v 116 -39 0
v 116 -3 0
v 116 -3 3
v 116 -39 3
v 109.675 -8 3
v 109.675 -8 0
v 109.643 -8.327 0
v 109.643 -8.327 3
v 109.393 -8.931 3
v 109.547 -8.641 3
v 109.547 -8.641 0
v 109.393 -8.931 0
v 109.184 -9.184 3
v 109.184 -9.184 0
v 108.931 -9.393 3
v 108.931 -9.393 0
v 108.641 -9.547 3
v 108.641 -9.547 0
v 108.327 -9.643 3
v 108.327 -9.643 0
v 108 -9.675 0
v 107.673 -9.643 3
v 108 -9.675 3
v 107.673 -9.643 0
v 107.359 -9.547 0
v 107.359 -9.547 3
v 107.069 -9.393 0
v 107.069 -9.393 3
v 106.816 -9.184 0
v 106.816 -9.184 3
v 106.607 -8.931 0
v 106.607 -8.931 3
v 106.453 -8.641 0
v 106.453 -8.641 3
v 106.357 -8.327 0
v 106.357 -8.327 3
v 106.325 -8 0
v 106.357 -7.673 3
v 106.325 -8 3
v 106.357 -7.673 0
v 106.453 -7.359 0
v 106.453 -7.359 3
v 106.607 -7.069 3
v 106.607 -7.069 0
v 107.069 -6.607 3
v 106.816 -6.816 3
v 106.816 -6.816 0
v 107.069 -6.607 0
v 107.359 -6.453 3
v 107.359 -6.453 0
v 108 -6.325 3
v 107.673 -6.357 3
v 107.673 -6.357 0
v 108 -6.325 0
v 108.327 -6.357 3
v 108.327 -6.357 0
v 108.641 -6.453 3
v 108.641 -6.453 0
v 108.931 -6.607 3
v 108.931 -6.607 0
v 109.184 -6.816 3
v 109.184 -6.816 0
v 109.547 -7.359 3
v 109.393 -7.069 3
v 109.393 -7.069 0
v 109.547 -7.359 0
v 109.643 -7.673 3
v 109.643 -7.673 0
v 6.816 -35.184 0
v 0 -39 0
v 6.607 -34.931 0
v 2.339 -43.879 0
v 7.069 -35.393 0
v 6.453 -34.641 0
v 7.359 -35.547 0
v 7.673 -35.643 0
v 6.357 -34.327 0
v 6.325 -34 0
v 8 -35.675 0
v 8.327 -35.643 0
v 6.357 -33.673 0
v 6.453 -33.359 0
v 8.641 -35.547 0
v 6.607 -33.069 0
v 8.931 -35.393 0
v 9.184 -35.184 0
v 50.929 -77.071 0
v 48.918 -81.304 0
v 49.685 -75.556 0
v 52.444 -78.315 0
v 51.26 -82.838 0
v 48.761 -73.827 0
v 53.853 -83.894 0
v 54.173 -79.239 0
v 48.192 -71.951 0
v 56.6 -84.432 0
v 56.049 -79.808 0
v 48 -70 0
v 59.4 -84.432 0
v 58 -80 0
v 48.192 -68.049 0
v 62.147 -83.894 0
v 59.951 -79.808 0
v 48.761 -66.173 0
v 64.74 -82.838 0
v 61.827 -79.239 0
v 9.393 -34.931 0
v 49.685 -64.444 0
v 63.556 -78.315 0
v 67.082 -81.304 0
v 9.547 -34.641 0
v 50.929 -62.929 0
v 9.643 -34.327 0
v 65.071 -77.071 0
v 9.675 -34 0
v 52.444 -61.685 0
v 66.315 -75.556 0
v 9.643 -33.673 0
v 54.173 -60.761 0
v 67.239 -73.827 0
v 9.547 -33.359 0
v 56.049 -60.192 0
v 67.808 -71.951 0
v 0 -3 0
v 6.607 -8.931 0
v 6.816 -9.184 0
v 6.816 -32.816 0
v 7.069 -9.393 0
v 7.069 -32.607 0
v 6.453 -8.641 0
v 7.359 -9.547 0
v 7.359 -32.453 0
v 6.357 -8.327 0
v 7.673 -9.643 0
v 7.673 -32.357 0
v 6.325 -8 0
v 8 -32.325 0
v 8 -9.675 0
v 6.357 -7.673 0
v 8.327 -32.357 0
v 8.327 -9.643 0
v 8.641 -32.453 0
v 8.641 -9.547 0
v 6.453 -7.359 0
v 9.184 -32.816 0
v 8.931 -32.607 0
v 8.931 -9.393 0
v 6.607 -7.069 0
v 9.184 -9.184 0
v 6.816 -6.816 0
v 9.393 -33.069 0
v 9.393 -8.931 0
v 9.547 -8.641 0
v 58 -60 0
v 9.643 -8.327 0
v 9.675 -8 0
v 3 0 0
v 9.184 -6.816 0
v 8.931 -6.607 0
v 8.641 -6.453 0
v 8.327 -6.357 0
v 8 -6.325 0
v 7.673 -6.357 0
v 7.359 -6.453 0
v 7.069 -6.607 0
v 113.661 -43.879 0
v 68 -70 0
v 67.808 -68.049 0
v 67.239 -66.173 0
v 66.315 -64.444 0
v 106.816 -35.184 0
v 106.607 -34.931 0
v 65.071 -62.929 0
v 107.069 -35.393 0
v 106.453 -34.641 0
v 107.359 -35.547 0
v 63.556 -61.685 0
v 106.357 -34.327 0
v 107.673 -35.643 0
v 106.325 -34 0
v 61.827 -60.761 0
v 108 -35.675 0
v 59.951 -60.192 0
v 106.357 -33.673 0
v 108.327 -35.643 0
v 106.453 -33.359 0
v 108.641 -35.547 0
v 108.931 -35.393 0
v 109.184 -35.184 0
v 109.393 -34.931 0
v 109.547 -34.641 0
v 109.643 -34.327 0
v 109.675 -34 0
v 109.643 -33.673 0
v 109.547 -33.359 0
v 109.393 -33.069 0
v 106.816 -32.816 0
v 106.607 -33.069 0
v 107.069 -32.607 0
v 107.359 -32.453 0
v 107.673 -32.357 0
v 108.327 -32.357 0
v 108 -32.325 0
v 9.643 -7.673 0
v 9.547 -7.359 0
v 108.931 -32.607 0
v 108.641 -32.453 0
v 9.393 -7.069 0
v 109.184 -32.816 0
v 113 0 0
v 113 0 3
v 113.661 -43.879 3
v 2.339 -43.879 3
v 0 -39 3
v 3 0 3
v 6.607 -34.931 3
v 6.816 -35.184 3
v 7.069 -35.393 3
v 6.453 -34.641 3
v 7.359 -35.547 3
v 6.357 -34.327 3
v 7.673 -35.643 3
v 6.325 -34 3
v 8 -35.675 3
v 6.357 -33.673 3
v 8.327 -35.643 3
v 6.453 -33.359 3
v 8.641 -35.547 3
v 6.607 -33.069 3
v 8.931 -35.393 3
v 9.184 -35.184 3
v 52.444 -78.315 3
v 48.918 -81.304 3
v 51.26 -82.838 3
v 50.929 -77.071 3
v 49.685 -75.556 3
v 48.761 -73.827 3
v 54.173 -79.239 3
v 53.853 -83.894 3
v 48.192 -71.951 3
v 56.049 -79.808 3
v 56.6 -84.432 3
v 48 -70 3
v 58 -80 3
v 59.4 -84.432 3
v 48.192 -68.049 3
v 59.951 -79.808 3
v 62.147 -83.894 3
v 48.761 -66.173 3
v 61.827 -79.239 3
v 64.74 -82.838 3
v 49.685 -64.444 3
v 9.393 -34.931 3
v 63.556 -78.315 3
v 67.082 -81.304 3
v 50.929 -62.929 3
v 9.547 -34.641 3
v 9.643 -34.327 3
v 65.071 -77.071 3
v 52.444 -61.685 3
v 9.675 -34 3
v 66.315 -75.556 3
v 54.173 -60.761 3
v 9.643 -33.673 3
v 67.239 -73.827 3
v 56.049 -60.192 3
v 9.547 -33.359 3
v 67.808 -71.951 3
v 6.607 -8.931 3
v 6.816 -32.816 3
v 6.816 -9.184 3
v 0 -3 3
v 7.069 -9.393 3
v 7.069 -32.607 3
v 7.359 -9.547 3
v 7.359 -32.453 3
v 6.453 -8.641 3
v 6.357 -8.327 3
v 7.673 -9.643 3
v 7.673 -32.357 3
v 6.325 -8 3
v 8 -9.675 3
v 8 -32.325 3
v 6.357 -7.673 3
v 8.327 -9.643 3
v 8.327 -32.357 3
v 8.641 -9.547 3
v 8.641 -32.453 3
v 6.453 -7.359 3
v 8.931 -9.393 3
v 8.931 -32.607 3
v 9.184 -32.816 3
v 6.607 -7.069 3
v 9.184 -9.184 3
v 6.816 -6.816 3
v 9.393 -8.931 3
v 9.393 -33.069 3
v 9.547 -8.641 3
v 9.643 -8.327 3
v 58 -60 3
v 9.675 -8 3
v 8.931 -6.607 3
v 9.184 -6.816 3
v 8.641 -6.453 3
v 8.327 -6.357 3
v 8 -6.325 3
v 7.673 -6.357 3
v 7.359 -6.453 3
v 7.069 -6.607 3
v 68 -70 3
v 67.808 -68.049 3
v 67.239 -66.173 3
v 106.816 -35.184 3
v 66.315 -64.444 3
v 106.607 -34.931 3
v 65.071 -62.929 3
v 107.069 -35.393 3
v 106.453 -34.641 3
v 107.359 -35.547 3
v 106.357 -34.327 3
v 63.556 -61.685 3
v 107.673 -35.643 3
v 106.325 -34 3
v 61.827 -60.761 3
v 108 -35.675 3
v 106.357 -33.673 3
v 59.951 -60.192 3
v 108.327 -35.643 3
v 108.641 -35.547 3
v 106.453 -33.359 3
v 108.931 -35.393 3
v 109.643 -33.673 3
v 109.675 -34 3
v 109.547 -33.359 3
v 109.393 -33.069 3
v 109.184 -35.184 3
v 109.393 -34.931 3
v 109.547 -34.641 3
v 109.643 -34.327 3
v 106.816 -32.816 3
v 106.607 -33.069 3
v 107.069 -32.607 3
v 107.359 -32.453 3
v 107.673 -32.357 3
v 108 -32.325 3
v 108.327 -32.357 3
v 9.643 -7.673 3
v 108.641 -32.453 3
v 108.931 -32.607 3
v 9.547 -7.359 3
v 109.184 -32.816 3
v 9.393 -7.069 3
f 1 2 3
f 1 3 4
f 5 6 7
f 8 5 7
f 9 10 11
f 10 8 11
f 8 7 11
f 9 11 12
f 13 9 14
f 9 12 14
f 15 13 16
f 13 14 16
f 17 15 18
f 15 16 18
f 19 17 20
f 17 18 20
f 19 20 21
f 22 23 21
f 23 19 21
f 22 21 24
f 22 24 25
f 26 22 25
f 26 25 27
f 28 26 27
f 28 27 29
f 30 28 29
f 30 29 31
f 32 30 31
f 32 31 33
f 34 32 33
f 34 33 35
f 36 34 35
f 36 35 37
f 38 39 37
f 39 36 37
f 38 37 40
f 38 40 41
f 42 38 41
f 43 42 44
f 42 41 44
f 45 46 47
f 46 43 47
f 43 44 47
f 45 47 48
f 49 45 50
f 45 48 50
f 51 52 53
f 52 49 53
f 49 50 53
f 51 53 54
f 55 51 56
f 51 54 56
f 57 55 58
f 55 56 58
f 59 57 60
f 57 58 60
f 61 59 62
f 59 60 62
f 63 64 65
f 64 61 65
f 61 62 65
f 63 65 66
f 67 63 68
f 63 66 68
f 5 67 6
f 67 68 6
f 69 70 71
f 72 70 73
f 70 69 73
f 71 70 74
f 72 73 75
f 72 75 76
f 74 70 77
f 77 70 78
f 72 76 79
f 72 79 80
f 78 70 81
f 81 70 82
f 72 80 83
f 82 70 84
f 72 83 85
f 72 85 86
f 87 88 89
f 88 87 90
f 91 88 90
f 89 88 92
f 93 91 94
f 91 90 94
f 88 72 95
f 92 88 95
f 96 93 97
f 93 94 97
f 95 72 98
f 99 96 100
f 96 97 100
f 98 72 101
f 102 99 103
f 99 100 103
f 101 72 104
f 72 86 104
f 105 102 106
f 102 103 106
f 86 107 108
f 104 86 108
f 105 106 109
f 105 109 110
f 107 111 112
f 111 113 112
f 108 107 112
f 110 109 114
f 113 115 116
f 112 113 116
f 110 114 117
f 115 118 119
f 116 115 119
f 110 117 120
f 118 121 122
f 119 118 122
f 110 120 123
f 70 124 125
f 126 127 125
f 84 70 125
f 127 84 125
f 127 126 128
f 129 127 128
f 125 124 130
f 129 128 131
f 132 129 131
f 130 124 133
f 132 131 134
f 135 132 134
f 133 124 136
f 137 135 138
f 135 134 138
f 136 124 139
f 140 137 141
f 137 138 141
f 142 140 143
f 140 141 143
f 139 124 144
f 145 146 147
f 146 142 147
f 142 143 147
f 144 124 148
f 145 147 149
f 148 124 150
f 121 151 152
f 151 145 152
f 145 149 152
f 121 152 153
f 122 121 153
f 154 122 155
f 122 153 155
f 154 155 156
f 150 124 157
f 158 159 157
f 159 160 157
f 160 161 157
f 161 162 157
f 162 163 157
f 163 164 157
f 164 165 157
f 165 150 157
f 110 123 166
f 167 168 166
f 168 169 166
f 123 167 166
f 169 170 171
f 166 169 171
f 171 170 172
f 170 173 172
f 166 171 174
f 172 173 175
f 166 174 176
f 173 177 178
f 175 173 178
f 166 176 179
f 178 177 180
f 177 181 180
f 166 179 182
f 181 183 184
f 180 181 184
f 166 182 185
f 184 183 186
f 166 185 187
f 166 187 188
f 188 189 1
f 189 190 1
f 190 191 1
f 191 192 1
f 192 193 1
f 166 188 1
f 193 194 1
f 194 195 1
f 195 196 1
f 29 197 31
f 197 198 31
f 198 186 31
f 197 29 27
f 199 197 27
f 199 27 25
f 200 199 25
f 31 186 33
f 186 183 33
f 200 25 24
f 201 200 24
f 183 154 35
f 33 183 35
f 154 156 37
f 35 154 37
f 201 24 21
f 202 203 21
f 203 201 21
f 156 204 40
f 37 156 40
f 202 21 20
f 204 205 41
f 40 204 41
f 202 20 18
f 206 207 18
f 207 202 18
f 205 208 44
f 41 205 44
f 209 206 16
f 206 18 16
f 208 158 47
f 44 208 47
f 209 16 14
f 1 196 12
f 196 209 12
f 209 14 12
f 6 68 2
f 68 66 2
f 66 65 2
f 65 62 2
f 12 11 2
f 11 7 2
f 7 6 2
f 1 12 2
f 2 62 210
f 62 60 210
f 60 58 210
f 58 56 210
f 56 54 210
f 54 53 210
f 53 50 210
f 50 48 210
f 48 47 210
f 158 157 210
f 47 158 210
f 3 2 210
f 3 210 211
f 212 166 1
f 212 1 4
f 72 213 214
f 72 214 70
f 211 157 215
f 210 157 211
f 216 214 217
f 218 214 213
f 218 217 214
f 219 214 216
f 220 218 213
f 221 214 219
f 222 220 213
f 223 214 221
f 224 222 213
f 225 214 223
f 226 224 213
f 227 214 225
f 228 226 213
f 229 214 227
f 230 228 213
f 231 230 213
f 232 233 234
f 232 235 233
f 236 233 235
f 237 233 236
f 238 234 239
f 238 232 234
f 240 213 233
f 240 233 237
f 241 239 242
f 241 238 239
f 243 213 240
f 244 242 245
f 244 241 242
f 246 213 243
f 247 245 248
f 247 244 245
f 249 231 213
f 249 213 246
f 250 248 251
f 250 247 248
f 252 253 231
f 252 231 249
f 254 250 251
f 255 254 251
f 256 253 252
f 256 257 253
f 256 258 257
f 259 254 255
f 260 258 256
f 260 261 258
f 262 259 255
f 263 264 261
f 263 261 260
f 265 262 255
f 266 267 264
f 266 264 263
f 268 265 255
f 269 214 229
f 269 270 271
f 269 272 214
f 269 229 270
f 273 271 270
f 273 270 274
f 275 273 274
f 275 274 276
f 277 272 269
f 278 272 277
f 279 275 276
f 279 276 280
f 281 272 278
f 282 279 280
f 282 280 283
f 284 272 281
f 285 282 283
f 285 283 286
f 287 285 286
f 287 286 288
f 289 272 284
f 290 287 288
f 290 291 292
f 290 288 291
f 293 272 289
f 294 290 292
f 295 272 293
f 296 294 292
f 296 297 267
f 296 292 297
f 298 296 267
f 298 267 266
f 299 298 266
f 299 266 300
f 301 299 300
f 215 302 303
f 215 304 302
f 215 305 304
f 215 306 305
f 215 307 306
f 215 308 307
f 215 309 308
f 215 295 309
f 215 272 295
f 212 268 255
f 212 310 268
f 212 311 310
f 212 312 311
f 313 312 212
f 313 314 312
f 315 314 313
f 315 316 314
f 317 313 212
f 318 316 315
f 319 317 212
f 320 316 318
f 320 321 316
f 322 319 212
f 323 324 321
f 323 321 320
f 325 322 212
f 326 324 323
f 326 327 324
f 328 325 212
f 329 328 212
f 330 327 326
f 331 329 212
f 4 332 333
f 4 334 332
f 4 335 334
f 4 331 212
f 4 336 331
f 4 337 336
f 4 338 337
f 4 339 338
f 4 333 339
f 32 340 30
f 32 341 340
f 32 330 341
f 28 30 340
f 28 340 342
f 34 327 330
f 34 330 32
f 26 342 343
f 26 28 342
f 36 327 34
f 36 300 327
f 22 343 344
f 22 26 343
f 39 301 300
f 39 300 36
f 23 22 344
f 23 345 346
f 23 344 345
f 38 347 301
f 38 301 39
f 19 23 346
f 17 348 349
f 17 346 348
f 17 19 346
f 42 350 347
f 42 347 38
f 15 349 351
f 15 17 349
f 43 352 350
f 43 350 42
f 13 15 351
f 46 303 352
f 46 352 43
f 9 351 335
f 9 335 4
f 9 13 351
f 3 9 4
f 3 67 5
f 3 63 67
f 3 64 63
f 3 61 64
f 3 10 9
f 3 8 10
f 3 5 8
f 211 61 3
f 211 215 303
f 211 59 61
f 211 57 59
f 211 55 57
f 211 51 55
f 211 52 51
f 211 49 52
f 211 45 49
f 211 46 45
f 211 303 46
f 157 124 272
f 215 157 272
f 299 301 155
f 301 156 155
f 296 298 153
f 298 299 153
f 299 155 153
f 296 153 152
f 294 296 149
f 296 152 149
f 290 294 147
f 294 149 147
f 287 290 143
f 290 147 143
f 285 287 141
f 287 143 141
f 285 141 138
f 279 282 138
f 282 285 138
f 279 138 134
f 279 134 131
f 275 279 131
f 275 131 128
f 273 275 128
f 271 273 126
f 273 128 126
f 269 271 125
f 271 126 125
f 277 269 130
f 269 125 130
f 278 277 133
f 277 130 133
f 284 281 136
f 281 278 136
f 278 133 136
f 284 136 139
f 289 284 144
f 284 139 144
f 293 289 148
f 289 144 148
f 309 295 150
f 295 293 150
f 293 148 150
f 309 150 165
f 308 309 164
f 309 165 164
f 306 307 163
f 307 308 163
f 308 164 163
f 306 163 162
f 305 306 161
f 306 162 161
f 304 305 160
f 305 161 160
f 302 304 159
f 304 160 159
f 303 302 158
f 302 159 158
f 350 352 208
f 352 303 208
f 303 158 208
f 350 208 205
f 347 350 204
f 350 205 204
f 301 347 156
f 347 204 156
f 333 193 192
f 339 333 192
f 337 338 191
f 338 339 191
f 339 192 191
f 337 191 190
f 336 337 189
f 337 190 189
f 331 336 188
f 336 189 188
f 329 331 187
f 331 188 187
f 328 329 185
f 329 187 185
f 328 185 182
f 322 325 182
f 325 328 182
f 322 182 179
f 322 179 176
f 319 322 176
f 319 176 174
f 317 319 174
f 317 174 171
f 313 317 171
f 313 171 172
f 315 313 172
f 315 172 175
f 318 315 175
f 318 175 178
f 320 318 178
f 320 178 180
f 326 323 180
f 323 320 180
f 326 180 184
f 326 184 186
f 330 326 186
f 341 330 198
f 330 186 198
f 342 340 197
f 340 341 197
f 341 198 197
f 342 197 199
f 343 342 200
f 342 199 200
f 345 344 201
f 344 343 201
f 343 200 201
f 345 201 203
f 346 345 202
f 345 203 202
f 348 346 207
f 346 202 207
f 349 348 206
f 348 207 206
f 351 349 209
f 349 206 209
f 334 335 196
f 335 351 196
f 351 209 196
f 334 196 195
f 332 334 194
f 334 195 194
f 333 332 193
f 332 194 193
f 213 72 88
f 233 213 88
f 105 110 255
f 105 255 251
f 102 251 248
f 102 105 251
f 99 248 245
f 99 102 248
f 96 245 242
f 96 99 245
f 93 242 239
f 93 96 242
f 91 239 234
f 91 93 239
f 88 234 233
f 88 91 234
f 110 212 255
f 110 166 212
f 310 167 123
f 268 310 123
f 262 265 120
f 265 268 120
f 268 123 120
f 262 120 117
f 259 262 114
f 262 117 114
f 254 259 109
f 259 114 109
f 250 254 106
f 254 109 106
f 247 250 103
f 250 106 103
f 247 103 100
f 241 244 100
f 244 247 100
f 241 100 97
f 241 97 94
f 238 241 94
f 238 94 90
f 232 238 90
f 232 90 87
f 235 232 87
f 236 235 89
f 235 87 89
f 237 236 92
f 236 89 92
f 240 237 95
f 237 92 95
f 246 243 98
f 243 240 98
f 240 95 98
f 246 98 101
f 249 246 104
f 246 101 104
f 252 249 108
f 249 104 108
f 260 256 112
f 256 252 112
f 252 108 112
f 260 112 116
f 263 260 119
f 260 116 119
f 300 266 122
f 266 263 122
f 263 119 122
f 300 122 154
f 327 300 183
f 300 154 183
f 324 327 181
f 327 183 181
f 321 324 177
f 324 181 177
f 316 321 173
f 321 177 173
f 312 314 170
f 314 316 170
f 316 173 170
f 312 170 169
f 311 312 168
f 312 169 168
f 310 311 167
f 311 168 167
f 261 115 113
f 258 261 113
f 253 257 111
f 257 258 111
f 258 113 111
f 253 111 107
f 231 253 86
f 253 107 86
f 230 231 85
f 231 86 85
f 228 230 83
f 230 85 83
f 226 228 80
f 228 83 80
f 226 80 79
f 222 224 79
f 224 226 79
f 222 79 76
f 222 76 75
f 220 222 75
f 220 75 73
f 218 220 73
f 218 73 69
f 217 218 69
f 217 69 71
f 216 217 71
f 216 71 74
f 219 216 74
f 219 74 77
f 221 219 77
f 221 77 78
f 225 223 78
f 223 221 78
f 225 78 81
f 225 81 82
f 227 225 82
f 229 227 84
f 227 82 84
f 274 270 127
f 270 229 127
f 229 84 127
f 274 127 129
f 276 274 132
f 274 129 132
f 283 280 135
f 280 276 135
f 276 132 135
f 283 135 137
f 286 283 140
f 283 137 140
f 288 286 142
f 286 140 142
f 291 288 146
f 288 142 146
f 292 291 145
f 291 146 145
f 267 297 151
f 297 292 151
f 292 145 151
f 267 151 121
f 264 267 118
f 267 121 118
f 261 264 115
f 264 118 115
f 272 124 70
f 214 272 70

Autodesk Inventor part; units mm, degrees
ref_plane "YZ Plane" through (0, 0, 0) normal (1, 0, 0) x (0, 1, 0)
ref_plane "XZ Plane" through (0, 0, 0) normal (0, 1, 0) x (-1, 0, 0)
ref_plane "XY Plane" through (0, 0, 0) normal (0, 0, 1) x (1, 0, 0)
sketch "Sketch1" plane through (0, 0, 0) normal (0, 0, 1) x (1, 0, 0)
  line L0 (0, 0) -> (116, 0)
  line L1 (116, 0) -> (116, -42)
  line L2 (0, 0) -> (0, -42)
  circle A0 centre (8, -8) radius 1.675
  circle A1 centre (108, -8) radius 1.675
  circle A2 centre (8, -34) radius 1.675
  circle A3 centre (108, -34) radius 1.675
  circle A4 centre (58, -70) radius 10
  circle A5 centre (58, -70) radius 14.5
  line L3 (0, -42) -> (48.9181, -81.3035)
  line L4 (116, -42) -> (67.0819, -81.3035)
  dimension "d0" = 116
  dimension "d1" = 42
  dimension "d2" = 3.35
  dimension "d3" = 8
  dimension "d4" = 8
  dimension "d7" = 100
  dimension "d10" = 26
  dimension "d13" = 42
  dimension "d14" = 20
  dimension "d15" = 29
  dimension "d16" = 70
extrude "Plate1" add sketch "Sketch1" along normal blind 3
chamfer "Corner Chamfer1" distance 3 angle 45 4 edges at (0, -42, 1.5) (0, 0, 1.5) (116, 0, 1.5) (116, -42, 1.5)
equation "\"d2\" = rivet_diameter"
equation "\"d13\" = d1"
equation "\"d17\" = Thickness"
equation "\"BendRadius\" = Thickness"
equation "\"BendReliefWidth\" = Thickness"
equation "\"BendReliefDepth\" = 0.5 * Thickness"
equation "\"CornerReliefSize\" = 4 * Thickness"
equation "\"MinimumRemnant\" = 2 * Thickness"
equation "\"TransitionRadius\" = BendRadius"
equation "\"JacobiRadiusSize\" = BendRadius"
equation "\"GapSize\" = Thickness"
equation "\"A_width\" = 46"
equation "\"A_joint_diameter\" = 16"
equation "\"A_joint_tolerance\" = 3"
equation "\"l___________\" = 0"
equation "\"l__________\" = 0"
equation "\"l_________\" = 0"
equation "\"rivet_diameter\" = 3.35"
equation "\"plate_thickness\" = 3"
equation "\"l________\" = 0"
equation "\"A_B_spacing\" = 2"
equation "\"L_Piston_Bottom\" = 21"
equation "\"L_Piston_Top\" = 25"
equation "\"thin_plate\" = 1.5"
equation "\"Thickness\" = 3"
properties part number "A_B_hinge" material "Stainless Steel"
